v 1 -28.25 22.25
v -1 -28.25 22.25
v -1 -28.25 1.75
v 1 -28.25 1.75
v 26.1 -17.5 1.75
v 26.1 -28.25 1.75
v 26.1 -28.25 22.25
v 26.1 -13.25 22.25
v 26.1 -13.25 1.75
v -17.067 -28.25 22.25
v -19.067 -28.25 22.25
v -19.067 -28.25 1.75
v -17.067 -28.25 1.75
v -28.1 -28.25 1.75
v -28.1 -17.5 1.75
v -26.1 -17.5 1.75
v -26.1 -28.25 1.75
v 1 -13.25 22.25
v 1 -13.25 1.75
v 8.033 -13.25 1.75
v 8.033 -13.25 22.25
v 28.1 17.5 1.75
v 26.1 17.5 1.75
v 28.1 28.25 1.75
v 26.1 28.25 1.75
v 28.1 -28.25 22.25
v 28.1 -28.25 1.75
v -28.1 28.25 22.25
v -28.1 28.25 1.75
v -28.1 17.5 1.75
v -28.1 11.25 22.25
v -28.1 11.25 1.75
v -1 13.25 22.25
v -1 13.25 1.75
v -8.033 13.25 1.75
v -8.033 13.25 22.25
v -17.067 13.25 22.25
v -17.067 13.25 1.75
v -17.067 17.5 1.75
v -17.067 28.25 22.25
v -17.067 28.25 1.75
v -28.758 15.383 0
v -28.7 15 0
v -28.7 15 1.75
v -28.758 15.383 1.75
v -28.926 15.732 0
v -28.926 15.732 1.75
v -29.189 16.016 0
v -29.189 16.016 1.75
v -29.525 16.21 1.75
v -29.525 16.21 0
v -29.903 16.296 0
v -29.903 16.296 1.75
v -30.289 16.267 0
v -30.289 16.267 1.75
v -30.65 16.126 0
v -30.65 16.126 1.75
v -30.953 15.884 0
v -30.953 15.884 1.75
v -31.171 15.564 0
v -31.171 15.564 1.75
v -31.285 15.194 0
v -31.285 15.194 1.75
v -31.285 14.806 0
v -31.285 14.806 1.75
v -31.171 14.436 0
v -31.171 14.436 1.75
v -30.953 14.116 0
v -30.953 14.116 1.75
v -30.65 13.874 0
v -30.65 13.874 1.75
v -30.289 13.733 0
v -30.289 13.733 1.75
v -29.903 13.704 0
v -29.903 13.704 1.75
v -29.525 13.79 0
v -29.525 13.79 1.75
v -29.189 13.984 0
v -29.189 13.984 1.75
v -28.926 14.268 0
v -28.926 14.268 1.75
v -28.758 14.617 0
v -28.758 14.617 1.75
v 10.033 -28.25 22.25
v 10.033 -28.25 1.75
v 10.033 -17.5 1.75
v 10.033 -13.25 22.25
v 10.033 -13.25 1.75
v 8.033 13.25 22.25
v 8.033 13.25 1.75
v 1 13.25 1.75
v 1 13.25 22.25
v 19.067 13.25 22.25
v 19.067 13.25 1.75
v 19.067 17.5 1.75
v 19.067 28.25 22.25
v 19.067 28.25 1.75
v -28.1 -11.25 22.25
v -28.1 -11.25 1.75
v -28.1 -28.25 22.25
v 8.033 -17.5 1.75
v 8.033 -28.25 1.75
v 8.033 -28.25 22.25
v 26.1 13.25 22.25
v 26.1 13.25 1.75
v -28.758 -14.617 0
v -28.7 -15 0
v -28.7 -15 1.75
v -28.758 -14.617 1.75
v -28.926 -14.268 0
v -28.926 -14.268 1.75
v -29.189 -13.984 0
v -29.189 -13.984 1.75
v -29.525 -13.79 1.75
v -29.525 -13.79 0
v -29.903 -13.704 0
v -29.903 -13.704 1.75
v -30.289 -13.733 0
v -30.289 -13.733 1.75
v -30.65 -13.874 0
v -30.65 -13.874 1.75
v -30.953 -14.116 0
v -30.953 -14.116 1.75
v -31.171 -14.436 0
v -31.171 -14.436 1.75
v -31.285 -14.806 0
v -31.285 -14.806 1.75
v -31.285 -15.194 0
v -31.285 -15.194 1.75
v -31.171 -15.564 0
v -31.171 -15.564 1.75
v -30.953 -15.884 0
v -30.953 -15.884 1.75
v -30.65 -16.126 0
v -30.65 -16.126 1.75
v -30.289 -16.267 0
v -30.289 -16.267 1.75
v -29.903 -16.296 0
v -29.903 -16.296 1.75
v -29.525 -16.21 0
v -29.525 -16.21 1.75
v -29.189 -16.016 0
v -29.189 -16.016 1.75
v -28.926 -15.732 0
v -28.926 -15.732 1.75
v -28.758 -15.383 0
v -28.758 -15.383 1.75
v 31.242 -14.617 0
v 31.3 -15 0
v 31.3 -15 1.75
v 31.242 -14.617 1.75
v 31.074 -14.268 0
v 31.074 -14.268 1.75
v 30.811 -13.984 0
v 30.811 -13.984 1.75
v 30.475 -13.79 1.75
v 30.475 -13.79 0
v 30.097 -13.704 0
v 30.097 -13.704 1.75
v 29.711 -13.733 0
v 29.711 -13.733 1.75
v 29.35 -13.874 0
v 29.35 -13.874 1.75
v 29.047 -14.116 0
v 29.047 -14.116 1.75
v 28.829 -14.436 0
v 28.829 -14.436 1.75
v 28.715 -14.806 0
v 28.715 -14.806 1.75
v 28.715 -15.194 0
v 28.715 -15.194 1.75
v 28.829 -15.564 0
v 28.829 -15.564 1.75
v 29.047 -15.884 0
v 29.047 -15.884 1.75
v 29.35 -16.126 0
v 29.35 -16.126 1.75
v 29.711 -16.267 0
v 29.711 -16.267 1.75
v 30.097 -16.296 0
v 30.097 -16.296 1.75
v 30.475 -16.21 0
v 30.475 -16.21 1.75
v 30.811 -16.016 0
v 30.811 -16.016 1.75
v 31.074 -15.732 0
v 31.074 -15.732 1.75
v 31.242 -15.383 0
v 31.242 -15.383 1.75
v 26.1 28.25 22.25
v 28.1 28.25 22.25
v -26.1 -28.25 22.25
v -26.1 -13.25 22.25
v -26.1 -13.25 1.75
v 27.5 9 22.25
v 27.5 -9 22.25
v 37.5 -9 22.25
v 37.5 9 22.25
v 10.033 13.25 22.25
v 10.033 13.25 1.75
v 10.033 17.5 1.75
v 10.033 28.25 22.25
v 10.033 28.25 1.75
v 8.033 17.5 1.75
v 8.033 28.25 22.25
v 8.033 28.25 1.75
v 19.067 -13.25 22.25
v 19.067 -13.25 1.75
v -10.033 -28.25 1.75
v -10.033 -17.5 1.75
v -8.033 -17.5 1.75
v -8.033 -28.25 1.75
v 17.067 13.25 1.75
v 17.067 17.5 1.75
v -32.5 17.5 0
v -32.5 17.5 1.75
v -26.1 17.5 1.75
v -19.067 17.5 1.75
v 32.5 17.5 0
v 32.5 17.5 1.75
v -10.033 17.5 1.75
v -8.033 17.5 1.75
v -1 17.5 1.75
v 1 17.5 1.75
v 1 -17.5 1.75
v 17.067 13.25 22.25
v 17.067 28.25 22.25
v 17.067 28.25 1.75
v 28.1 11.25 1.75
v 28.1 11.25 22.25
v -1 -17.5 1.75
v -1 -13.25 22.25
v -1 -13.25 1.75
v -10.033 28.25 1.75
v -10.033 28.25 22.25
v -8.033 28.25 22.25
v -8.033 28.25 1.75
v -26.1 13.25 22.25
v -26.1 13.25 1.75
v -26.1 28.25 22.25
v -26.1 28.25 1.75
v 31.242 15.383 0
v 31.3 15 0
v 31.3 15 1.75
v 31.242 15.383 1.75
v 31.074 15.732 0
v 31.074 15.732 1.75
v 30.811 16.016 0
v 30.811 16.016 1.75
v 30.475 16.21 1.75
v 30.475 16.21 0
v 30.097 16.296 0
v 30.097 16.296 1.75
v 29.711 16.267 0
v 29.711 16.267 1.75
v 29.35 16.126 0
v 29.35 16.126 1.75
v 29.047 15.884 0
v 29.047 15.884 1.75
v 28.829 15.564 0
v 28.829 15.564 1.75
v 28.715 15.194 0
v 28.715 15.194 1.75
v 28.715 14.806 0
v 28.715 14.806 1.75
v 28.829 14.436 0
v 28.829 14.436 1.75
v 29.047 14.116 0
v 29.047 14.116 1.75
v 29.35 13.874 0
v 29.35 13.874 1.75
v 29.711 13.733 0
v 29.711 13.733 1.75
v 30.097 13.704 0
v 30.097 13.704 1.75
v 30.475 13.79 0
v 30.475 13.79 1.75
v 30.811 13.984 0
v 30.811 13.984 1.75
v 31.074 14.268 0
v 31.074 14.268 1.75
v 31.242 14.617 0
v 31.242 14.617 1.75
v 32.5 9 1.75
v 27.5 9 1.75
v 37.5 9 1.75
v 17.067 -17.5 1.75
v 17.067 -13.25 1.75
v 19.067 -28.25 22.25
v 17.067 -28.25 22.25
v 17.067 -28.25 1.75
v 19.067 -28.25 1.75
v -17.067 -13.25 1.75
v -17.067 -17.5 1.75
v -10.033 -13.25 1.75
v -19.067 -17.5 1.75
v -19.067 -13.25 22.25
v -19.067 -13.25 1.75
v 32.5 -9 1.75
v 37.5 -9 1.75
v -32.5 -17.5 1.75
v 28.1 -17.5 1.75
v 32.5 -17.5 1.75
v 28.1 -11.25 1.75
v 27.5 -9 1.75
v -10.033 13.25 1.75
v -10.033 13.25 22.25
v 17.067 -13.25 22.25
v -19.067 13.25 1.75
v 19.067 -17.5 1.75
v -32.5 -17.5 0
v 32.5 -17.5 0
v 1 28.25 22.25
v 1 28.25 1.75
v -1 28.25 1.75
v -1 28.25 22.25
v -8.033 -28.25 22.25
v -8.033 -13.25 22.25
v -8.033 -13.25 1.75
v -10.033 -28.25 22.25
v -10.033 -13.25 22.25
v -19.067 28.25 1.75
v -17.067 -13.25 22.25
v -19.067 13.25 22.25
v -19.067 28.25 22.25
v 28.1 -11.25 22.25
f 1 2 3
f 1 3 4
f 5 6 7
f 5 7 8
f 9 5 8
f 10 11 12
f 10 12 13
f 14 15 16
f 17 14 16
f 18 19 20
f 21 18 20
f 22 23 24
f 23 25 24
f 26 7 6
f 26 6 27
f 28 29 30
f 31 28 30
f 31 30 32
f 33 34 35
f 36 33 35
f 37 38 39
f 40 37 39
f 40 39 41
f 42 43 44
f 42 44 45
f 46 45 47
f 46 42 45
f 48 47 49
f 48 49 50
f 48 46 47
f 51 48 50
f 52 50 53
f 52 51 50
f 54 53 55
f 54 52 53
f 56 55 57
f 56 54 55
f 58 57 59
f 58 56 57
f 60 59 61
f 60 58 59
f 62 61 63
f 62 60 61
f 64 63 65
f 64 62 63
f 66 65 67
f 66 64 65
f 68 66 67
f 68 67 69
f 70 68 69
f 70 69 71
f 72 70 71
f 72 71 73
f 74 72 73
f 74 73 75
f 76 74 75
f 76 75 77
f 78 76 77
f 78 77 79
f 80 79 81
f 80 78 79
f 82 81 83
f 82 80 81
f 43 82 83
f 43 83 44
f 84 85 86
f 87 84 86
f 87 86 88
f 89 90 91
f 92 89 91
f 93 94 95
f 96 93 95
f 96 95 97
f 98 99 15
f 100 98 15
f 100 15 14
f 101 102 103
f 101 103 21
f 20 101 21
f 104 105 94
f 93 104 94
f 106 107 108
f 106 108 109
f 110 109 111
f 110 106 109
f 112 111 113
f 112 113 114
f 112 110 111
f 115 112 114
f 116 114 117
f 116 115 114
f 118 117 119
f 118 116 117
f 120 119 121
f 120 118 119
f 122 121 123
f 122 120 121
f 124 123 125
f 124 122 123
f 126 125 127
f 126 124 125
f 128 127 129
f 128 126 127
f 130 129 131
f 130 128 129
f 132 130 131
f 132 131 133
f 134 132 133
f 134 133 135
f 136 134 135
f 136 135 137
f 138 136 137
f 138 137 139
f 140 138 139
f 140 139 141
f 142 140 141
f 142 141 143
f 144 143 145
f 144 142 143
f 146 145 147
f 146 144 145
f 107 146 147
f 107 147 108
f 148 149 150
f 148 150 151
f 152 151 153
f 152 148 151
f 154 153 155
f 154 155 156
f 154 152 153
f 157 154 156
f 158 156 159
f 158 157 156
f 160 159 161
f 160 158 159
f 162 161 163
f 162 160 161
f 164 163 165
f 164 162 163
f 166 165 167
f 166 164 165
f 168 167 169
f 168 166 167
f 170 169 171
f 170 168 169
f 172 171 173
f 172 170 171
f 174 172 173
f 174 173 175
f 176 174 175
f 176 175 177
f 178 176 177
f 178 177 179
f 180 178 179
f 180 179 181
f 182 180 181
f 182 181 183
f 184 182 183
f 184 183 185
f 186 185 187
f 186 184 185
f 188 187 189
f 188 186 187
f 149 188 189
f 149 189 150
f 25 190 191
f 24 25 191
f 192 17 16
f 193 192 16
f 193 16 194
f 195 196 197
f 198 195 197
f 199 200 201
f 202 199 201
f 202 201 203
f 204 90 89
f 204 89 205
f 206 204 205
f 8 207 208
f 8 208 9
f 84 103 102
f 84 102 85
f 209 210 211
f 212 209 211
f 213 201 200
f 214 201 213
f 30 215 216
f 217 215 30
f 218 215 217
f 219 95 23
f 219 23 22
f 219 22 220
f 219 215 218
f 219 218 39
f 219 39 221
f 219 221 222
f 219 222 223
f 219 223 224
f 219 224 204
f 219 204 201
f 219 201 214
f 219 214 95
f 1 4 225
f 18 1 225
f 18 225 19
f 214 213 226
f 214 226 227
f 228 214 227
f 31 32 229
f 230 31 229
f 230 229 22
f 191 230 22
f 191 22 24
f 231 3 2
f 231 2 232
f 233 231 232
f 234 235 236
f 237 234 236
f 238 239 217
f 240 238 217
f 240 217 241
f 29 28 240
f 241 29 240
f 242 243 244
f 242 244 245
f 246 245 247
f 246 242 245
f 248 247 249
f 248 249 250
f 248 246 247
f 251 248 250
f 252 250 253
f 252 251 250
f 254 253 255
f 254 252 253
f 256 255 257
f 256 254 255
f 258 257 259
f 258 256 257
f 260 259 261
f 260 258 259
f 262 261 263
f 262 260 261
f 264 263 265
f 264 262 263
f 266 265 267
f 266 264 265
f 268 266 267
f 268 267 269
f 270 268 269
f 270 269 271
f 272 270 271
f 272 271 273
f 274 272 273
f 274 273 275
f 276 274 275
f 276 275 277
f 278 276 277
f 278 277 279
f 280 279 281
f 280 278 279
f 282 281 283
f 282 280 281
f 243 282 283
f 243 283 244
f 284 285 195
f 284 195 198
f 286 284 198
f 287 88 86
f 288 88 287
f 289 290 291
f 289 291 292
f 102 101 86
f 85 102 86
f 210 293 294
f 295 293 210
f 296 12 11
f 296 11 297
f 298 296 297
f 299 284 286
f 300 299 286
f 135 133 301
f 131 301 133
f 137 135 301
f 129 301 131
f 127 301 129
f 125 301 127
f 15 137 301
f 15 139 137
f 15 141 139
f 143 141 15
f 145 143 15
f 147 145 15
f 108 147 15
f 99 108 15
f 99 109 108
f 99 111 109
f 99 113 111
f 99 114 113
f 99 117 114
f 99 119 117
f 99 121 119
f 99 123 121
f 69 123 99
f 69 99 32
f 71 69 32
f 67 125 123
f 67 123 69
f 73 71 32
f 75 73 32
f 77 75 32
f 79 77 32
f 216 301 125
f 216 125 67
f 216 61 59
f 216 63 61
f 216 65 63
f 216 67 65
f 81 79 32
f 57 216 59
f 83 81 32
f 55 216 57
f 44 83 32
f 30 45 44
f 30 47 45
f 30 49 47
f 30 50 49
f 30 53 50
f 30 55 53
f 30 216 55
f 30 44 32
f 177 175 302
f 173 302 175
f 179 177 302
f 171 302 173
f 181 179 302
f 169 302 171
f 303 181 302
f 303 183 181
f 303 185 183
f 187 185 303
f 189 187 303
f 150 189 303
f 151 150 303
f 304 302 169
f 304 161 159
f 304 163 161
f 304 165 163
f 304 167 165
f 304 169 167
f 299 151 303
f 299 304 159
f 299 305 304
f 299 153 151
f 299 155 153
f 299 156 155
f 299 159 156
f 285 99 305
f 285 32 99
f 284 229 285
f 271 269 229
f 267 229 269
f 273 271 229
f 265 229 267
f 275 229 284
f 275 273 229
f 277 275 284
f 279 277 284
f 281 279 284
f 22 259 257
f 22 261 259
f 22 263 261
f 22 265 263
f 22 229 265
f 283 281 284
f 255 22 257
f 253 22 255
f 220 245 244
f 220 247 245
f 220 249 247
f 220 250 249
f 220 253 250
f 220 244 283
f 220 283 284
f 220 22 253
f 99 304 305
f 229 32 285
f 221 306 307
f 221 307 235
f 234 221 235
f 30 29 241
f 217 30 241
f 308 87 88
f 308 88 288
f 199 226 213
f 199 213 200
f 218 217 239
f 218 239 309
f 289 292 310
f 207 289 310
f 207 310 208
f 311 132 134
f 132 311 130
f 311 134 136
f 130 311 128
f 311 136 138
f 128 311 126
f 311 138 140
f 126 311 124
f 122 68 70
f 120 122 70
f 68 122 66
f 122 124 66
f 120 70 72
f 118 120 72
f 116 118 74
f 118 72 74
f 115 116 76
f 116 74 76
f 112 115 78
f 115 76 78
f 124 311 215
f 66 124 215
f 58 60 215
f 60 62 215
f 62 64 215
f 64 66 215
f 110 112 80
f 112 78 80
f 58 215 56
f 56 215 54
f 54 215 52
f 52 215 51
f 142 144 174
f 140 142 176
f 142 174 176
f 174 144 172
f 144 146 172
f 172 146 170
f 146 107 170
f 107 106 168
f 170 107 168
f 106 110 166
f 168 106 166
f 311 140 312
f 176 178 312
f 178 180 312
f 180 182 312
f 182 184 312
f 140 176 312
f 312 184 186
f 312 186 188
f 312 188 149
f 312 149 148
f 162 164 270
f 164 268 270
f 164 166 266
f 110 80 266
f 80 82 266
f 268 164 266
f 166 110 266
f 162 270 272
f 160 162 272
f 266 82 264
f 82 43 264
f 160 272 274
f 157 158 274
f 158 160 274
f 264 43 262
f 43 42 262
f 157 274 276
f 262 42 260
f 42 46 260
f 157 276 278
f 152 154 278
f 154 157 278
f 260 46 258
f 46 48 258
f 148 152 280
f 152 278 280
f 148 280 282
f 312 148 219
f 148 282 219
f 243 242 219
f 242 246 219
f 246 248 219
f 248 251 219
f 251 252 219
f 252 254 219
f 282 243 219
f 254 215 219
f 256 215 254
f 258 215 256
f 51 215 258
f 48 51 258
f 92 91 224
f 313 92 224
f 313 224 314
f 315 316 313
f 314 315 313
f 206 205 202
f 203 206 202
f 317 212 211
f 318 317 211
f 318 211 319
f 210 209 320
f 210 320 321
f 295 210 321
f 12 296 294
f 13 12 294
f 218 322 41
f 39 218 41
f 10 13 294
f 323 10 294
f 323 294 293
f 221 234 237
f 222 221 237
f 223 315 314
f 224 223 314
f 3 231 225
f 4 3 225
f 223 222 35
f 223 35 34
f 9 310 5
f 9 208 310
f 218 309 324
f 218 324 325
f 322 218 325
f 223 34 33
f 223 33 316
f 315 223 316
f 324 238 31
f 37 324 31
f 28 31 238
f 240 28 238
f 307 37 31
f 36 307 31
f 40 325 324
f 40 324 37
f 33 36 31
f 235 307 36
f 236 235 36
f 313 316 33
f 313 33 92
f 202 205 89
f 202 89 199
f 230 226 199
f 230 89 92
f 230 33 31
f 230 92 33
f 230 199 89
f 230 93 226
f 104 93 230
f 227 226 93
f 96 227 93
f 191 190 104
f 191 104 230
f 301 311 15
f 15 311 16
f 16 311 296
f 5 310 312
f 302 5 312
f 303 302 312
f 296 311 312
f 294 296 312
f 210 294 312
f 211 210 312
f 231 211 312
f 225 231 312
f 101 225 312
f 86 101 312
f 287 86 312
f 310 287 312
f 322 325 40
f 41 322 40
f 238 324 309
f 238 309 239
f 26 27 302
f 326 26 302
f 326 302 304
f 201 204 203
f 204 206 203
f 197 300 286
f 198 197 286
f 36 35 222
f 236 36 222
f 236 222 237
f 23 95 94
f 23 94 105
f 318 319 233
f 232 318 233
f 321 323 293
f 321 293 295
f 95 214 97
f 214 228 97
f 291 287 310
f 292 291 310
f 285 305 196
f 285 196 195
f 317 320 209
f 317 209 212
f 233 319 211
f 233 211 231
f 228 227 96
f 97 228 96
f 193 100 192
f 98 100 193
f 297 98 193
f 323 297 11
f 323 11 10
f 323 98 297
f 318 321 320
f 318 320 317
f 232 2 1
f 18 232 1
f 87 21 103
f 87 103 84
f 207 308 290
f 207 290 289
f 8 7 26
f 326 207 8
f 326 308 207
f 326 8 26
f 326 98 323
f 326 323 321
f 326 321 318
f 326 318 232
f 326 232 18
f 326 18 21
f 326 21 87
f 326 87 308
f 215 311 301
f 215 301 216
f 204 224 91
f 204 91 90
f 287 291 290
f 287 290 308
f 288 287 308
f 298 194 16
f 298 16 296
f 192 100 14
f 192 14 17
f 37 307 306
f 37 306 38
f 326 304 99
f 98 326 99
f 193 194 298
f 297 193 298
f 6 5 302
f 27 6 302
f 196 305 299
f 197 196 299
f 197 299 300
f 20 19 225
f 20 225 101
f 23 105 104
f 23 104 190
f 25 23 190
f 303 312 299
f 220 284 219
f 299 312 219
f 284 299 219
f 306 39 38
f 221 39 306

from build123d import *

# Parameters (mm, degrees)
F0_W     = 65
F0_H     = 35
F0_R     = 1.3
F1_DEPTH = 1.75
F2_W     = 2
F2_H     = 15
F3_DEPTH = 20.5
F4_W     = 10
F4_H     = 18
F5_DEPTH = 20.5


with BuildPart() as f1:
    # F0 (on Top) → F1 (new body)
    with BuildSketch(Plane.XY):
        Rectangle(F0_W, F0_H)
        with Locations((-30, -15)):
            Circle(F0_R, mode=Mode.SUBTRACT)
        with Locations((30, -15)):
            Circle(F0_R, mode=Mode.SUBTRACT)
        with Locations((-30, 15)):
            Circle(F0_R, mode=Mode.SUBTRACT)
        with Locations((30, 15)):
            Circle(F0_R, mode=Mode.SUBTRACT)
    extrude(amount=F1_DEPTH)

    # F2 (on face) → F3 (join)
    with BuildSketch(Plane.XY.offset(1.75)):
        with Locations((-27.1, 20.75)):
            Rectangle(F2_W, F2_H)
        Polygon((-26.1, 13.25), (-28.1, 13.25), (-28.1, 11.25), (28.1, 11.25), (28.1, 13.25), (26.1, 13.25), (19.066667, 13.25), (17.066667, 13.25), (10.033333, 13.25), (8.033333, 13.25), (1, 13.25), (-1, 13.25), (-8.033333, 13.25), (-10.033333, 13.25), (-17.066667, 13.25), (-19.066667, 13.25), align=None)
        with Locations((-18.066667, 20.75)):
            Rectangle(F2_W, F2_H)
        with Locations((27.1, 20.75)):
            Rectangle(F2_W, F2_H)
        with Locations((-9.033333, 20.75)):
            Rectangle(F2_W, F2_H)
        with Locations((18.066667, 20.75)):
            Rectangle(F2_W, F2_H)
        with Locations((0, 20.75)):
            Rectangle(F2_W, F2_H)
        with Locations((9.033333, 20.75)):
            Rectangle(F2_W, F2_H)
        with Locations((-9.033333, -20.75)):
            Rectangle(F2_W, F2_H)
        Polygon((-17.066667, -13.25), (-10.033333, -13.25), (-8.033333, -13.25), (-1, -13.25), (1, -13.25), (8.033333, -13.25), (10.033333, -13.25), (17.066667, -13.25), (19.066667, -13.25), (26.1, -13.25), (28.1, -13.25), (28.1, -11.25), (-28.1, -11.25), (-28.1, -13.25), (-26.1, -13.25), (-19.066667, -13.25), align=None)
        with Locations((-18.066667, -20.75)):
            Rectangle(F2_W, F2_H)
        with Locations((0, -20.75)):
            Rectangle(F2_W, F2_H)
        with Locations((-27.1, -20.75)):
            Rectangle(F2_W, F2_H)
        with Locations((9.033333, -20.75)):
            Rectangle(F2_W, F2_H)
        with Locations((18.066667, -20.75)):
            Rectangle(F2_W, F2_H)
        with Locations((27.1, -20.75)):
            Rectangle(F2_W, F2_H)
    extrude(amount=F3_DEPTH)

    # F4 (on face) → F5 (join, through all)
    with BuildSketch(Plane.XY.offset(1.75)):
        with Locations((32.5, 0)):
            Rectangle(F4_W, F4_H)
    extrude(amount=F5_DEPTH)


solid = f1.part
